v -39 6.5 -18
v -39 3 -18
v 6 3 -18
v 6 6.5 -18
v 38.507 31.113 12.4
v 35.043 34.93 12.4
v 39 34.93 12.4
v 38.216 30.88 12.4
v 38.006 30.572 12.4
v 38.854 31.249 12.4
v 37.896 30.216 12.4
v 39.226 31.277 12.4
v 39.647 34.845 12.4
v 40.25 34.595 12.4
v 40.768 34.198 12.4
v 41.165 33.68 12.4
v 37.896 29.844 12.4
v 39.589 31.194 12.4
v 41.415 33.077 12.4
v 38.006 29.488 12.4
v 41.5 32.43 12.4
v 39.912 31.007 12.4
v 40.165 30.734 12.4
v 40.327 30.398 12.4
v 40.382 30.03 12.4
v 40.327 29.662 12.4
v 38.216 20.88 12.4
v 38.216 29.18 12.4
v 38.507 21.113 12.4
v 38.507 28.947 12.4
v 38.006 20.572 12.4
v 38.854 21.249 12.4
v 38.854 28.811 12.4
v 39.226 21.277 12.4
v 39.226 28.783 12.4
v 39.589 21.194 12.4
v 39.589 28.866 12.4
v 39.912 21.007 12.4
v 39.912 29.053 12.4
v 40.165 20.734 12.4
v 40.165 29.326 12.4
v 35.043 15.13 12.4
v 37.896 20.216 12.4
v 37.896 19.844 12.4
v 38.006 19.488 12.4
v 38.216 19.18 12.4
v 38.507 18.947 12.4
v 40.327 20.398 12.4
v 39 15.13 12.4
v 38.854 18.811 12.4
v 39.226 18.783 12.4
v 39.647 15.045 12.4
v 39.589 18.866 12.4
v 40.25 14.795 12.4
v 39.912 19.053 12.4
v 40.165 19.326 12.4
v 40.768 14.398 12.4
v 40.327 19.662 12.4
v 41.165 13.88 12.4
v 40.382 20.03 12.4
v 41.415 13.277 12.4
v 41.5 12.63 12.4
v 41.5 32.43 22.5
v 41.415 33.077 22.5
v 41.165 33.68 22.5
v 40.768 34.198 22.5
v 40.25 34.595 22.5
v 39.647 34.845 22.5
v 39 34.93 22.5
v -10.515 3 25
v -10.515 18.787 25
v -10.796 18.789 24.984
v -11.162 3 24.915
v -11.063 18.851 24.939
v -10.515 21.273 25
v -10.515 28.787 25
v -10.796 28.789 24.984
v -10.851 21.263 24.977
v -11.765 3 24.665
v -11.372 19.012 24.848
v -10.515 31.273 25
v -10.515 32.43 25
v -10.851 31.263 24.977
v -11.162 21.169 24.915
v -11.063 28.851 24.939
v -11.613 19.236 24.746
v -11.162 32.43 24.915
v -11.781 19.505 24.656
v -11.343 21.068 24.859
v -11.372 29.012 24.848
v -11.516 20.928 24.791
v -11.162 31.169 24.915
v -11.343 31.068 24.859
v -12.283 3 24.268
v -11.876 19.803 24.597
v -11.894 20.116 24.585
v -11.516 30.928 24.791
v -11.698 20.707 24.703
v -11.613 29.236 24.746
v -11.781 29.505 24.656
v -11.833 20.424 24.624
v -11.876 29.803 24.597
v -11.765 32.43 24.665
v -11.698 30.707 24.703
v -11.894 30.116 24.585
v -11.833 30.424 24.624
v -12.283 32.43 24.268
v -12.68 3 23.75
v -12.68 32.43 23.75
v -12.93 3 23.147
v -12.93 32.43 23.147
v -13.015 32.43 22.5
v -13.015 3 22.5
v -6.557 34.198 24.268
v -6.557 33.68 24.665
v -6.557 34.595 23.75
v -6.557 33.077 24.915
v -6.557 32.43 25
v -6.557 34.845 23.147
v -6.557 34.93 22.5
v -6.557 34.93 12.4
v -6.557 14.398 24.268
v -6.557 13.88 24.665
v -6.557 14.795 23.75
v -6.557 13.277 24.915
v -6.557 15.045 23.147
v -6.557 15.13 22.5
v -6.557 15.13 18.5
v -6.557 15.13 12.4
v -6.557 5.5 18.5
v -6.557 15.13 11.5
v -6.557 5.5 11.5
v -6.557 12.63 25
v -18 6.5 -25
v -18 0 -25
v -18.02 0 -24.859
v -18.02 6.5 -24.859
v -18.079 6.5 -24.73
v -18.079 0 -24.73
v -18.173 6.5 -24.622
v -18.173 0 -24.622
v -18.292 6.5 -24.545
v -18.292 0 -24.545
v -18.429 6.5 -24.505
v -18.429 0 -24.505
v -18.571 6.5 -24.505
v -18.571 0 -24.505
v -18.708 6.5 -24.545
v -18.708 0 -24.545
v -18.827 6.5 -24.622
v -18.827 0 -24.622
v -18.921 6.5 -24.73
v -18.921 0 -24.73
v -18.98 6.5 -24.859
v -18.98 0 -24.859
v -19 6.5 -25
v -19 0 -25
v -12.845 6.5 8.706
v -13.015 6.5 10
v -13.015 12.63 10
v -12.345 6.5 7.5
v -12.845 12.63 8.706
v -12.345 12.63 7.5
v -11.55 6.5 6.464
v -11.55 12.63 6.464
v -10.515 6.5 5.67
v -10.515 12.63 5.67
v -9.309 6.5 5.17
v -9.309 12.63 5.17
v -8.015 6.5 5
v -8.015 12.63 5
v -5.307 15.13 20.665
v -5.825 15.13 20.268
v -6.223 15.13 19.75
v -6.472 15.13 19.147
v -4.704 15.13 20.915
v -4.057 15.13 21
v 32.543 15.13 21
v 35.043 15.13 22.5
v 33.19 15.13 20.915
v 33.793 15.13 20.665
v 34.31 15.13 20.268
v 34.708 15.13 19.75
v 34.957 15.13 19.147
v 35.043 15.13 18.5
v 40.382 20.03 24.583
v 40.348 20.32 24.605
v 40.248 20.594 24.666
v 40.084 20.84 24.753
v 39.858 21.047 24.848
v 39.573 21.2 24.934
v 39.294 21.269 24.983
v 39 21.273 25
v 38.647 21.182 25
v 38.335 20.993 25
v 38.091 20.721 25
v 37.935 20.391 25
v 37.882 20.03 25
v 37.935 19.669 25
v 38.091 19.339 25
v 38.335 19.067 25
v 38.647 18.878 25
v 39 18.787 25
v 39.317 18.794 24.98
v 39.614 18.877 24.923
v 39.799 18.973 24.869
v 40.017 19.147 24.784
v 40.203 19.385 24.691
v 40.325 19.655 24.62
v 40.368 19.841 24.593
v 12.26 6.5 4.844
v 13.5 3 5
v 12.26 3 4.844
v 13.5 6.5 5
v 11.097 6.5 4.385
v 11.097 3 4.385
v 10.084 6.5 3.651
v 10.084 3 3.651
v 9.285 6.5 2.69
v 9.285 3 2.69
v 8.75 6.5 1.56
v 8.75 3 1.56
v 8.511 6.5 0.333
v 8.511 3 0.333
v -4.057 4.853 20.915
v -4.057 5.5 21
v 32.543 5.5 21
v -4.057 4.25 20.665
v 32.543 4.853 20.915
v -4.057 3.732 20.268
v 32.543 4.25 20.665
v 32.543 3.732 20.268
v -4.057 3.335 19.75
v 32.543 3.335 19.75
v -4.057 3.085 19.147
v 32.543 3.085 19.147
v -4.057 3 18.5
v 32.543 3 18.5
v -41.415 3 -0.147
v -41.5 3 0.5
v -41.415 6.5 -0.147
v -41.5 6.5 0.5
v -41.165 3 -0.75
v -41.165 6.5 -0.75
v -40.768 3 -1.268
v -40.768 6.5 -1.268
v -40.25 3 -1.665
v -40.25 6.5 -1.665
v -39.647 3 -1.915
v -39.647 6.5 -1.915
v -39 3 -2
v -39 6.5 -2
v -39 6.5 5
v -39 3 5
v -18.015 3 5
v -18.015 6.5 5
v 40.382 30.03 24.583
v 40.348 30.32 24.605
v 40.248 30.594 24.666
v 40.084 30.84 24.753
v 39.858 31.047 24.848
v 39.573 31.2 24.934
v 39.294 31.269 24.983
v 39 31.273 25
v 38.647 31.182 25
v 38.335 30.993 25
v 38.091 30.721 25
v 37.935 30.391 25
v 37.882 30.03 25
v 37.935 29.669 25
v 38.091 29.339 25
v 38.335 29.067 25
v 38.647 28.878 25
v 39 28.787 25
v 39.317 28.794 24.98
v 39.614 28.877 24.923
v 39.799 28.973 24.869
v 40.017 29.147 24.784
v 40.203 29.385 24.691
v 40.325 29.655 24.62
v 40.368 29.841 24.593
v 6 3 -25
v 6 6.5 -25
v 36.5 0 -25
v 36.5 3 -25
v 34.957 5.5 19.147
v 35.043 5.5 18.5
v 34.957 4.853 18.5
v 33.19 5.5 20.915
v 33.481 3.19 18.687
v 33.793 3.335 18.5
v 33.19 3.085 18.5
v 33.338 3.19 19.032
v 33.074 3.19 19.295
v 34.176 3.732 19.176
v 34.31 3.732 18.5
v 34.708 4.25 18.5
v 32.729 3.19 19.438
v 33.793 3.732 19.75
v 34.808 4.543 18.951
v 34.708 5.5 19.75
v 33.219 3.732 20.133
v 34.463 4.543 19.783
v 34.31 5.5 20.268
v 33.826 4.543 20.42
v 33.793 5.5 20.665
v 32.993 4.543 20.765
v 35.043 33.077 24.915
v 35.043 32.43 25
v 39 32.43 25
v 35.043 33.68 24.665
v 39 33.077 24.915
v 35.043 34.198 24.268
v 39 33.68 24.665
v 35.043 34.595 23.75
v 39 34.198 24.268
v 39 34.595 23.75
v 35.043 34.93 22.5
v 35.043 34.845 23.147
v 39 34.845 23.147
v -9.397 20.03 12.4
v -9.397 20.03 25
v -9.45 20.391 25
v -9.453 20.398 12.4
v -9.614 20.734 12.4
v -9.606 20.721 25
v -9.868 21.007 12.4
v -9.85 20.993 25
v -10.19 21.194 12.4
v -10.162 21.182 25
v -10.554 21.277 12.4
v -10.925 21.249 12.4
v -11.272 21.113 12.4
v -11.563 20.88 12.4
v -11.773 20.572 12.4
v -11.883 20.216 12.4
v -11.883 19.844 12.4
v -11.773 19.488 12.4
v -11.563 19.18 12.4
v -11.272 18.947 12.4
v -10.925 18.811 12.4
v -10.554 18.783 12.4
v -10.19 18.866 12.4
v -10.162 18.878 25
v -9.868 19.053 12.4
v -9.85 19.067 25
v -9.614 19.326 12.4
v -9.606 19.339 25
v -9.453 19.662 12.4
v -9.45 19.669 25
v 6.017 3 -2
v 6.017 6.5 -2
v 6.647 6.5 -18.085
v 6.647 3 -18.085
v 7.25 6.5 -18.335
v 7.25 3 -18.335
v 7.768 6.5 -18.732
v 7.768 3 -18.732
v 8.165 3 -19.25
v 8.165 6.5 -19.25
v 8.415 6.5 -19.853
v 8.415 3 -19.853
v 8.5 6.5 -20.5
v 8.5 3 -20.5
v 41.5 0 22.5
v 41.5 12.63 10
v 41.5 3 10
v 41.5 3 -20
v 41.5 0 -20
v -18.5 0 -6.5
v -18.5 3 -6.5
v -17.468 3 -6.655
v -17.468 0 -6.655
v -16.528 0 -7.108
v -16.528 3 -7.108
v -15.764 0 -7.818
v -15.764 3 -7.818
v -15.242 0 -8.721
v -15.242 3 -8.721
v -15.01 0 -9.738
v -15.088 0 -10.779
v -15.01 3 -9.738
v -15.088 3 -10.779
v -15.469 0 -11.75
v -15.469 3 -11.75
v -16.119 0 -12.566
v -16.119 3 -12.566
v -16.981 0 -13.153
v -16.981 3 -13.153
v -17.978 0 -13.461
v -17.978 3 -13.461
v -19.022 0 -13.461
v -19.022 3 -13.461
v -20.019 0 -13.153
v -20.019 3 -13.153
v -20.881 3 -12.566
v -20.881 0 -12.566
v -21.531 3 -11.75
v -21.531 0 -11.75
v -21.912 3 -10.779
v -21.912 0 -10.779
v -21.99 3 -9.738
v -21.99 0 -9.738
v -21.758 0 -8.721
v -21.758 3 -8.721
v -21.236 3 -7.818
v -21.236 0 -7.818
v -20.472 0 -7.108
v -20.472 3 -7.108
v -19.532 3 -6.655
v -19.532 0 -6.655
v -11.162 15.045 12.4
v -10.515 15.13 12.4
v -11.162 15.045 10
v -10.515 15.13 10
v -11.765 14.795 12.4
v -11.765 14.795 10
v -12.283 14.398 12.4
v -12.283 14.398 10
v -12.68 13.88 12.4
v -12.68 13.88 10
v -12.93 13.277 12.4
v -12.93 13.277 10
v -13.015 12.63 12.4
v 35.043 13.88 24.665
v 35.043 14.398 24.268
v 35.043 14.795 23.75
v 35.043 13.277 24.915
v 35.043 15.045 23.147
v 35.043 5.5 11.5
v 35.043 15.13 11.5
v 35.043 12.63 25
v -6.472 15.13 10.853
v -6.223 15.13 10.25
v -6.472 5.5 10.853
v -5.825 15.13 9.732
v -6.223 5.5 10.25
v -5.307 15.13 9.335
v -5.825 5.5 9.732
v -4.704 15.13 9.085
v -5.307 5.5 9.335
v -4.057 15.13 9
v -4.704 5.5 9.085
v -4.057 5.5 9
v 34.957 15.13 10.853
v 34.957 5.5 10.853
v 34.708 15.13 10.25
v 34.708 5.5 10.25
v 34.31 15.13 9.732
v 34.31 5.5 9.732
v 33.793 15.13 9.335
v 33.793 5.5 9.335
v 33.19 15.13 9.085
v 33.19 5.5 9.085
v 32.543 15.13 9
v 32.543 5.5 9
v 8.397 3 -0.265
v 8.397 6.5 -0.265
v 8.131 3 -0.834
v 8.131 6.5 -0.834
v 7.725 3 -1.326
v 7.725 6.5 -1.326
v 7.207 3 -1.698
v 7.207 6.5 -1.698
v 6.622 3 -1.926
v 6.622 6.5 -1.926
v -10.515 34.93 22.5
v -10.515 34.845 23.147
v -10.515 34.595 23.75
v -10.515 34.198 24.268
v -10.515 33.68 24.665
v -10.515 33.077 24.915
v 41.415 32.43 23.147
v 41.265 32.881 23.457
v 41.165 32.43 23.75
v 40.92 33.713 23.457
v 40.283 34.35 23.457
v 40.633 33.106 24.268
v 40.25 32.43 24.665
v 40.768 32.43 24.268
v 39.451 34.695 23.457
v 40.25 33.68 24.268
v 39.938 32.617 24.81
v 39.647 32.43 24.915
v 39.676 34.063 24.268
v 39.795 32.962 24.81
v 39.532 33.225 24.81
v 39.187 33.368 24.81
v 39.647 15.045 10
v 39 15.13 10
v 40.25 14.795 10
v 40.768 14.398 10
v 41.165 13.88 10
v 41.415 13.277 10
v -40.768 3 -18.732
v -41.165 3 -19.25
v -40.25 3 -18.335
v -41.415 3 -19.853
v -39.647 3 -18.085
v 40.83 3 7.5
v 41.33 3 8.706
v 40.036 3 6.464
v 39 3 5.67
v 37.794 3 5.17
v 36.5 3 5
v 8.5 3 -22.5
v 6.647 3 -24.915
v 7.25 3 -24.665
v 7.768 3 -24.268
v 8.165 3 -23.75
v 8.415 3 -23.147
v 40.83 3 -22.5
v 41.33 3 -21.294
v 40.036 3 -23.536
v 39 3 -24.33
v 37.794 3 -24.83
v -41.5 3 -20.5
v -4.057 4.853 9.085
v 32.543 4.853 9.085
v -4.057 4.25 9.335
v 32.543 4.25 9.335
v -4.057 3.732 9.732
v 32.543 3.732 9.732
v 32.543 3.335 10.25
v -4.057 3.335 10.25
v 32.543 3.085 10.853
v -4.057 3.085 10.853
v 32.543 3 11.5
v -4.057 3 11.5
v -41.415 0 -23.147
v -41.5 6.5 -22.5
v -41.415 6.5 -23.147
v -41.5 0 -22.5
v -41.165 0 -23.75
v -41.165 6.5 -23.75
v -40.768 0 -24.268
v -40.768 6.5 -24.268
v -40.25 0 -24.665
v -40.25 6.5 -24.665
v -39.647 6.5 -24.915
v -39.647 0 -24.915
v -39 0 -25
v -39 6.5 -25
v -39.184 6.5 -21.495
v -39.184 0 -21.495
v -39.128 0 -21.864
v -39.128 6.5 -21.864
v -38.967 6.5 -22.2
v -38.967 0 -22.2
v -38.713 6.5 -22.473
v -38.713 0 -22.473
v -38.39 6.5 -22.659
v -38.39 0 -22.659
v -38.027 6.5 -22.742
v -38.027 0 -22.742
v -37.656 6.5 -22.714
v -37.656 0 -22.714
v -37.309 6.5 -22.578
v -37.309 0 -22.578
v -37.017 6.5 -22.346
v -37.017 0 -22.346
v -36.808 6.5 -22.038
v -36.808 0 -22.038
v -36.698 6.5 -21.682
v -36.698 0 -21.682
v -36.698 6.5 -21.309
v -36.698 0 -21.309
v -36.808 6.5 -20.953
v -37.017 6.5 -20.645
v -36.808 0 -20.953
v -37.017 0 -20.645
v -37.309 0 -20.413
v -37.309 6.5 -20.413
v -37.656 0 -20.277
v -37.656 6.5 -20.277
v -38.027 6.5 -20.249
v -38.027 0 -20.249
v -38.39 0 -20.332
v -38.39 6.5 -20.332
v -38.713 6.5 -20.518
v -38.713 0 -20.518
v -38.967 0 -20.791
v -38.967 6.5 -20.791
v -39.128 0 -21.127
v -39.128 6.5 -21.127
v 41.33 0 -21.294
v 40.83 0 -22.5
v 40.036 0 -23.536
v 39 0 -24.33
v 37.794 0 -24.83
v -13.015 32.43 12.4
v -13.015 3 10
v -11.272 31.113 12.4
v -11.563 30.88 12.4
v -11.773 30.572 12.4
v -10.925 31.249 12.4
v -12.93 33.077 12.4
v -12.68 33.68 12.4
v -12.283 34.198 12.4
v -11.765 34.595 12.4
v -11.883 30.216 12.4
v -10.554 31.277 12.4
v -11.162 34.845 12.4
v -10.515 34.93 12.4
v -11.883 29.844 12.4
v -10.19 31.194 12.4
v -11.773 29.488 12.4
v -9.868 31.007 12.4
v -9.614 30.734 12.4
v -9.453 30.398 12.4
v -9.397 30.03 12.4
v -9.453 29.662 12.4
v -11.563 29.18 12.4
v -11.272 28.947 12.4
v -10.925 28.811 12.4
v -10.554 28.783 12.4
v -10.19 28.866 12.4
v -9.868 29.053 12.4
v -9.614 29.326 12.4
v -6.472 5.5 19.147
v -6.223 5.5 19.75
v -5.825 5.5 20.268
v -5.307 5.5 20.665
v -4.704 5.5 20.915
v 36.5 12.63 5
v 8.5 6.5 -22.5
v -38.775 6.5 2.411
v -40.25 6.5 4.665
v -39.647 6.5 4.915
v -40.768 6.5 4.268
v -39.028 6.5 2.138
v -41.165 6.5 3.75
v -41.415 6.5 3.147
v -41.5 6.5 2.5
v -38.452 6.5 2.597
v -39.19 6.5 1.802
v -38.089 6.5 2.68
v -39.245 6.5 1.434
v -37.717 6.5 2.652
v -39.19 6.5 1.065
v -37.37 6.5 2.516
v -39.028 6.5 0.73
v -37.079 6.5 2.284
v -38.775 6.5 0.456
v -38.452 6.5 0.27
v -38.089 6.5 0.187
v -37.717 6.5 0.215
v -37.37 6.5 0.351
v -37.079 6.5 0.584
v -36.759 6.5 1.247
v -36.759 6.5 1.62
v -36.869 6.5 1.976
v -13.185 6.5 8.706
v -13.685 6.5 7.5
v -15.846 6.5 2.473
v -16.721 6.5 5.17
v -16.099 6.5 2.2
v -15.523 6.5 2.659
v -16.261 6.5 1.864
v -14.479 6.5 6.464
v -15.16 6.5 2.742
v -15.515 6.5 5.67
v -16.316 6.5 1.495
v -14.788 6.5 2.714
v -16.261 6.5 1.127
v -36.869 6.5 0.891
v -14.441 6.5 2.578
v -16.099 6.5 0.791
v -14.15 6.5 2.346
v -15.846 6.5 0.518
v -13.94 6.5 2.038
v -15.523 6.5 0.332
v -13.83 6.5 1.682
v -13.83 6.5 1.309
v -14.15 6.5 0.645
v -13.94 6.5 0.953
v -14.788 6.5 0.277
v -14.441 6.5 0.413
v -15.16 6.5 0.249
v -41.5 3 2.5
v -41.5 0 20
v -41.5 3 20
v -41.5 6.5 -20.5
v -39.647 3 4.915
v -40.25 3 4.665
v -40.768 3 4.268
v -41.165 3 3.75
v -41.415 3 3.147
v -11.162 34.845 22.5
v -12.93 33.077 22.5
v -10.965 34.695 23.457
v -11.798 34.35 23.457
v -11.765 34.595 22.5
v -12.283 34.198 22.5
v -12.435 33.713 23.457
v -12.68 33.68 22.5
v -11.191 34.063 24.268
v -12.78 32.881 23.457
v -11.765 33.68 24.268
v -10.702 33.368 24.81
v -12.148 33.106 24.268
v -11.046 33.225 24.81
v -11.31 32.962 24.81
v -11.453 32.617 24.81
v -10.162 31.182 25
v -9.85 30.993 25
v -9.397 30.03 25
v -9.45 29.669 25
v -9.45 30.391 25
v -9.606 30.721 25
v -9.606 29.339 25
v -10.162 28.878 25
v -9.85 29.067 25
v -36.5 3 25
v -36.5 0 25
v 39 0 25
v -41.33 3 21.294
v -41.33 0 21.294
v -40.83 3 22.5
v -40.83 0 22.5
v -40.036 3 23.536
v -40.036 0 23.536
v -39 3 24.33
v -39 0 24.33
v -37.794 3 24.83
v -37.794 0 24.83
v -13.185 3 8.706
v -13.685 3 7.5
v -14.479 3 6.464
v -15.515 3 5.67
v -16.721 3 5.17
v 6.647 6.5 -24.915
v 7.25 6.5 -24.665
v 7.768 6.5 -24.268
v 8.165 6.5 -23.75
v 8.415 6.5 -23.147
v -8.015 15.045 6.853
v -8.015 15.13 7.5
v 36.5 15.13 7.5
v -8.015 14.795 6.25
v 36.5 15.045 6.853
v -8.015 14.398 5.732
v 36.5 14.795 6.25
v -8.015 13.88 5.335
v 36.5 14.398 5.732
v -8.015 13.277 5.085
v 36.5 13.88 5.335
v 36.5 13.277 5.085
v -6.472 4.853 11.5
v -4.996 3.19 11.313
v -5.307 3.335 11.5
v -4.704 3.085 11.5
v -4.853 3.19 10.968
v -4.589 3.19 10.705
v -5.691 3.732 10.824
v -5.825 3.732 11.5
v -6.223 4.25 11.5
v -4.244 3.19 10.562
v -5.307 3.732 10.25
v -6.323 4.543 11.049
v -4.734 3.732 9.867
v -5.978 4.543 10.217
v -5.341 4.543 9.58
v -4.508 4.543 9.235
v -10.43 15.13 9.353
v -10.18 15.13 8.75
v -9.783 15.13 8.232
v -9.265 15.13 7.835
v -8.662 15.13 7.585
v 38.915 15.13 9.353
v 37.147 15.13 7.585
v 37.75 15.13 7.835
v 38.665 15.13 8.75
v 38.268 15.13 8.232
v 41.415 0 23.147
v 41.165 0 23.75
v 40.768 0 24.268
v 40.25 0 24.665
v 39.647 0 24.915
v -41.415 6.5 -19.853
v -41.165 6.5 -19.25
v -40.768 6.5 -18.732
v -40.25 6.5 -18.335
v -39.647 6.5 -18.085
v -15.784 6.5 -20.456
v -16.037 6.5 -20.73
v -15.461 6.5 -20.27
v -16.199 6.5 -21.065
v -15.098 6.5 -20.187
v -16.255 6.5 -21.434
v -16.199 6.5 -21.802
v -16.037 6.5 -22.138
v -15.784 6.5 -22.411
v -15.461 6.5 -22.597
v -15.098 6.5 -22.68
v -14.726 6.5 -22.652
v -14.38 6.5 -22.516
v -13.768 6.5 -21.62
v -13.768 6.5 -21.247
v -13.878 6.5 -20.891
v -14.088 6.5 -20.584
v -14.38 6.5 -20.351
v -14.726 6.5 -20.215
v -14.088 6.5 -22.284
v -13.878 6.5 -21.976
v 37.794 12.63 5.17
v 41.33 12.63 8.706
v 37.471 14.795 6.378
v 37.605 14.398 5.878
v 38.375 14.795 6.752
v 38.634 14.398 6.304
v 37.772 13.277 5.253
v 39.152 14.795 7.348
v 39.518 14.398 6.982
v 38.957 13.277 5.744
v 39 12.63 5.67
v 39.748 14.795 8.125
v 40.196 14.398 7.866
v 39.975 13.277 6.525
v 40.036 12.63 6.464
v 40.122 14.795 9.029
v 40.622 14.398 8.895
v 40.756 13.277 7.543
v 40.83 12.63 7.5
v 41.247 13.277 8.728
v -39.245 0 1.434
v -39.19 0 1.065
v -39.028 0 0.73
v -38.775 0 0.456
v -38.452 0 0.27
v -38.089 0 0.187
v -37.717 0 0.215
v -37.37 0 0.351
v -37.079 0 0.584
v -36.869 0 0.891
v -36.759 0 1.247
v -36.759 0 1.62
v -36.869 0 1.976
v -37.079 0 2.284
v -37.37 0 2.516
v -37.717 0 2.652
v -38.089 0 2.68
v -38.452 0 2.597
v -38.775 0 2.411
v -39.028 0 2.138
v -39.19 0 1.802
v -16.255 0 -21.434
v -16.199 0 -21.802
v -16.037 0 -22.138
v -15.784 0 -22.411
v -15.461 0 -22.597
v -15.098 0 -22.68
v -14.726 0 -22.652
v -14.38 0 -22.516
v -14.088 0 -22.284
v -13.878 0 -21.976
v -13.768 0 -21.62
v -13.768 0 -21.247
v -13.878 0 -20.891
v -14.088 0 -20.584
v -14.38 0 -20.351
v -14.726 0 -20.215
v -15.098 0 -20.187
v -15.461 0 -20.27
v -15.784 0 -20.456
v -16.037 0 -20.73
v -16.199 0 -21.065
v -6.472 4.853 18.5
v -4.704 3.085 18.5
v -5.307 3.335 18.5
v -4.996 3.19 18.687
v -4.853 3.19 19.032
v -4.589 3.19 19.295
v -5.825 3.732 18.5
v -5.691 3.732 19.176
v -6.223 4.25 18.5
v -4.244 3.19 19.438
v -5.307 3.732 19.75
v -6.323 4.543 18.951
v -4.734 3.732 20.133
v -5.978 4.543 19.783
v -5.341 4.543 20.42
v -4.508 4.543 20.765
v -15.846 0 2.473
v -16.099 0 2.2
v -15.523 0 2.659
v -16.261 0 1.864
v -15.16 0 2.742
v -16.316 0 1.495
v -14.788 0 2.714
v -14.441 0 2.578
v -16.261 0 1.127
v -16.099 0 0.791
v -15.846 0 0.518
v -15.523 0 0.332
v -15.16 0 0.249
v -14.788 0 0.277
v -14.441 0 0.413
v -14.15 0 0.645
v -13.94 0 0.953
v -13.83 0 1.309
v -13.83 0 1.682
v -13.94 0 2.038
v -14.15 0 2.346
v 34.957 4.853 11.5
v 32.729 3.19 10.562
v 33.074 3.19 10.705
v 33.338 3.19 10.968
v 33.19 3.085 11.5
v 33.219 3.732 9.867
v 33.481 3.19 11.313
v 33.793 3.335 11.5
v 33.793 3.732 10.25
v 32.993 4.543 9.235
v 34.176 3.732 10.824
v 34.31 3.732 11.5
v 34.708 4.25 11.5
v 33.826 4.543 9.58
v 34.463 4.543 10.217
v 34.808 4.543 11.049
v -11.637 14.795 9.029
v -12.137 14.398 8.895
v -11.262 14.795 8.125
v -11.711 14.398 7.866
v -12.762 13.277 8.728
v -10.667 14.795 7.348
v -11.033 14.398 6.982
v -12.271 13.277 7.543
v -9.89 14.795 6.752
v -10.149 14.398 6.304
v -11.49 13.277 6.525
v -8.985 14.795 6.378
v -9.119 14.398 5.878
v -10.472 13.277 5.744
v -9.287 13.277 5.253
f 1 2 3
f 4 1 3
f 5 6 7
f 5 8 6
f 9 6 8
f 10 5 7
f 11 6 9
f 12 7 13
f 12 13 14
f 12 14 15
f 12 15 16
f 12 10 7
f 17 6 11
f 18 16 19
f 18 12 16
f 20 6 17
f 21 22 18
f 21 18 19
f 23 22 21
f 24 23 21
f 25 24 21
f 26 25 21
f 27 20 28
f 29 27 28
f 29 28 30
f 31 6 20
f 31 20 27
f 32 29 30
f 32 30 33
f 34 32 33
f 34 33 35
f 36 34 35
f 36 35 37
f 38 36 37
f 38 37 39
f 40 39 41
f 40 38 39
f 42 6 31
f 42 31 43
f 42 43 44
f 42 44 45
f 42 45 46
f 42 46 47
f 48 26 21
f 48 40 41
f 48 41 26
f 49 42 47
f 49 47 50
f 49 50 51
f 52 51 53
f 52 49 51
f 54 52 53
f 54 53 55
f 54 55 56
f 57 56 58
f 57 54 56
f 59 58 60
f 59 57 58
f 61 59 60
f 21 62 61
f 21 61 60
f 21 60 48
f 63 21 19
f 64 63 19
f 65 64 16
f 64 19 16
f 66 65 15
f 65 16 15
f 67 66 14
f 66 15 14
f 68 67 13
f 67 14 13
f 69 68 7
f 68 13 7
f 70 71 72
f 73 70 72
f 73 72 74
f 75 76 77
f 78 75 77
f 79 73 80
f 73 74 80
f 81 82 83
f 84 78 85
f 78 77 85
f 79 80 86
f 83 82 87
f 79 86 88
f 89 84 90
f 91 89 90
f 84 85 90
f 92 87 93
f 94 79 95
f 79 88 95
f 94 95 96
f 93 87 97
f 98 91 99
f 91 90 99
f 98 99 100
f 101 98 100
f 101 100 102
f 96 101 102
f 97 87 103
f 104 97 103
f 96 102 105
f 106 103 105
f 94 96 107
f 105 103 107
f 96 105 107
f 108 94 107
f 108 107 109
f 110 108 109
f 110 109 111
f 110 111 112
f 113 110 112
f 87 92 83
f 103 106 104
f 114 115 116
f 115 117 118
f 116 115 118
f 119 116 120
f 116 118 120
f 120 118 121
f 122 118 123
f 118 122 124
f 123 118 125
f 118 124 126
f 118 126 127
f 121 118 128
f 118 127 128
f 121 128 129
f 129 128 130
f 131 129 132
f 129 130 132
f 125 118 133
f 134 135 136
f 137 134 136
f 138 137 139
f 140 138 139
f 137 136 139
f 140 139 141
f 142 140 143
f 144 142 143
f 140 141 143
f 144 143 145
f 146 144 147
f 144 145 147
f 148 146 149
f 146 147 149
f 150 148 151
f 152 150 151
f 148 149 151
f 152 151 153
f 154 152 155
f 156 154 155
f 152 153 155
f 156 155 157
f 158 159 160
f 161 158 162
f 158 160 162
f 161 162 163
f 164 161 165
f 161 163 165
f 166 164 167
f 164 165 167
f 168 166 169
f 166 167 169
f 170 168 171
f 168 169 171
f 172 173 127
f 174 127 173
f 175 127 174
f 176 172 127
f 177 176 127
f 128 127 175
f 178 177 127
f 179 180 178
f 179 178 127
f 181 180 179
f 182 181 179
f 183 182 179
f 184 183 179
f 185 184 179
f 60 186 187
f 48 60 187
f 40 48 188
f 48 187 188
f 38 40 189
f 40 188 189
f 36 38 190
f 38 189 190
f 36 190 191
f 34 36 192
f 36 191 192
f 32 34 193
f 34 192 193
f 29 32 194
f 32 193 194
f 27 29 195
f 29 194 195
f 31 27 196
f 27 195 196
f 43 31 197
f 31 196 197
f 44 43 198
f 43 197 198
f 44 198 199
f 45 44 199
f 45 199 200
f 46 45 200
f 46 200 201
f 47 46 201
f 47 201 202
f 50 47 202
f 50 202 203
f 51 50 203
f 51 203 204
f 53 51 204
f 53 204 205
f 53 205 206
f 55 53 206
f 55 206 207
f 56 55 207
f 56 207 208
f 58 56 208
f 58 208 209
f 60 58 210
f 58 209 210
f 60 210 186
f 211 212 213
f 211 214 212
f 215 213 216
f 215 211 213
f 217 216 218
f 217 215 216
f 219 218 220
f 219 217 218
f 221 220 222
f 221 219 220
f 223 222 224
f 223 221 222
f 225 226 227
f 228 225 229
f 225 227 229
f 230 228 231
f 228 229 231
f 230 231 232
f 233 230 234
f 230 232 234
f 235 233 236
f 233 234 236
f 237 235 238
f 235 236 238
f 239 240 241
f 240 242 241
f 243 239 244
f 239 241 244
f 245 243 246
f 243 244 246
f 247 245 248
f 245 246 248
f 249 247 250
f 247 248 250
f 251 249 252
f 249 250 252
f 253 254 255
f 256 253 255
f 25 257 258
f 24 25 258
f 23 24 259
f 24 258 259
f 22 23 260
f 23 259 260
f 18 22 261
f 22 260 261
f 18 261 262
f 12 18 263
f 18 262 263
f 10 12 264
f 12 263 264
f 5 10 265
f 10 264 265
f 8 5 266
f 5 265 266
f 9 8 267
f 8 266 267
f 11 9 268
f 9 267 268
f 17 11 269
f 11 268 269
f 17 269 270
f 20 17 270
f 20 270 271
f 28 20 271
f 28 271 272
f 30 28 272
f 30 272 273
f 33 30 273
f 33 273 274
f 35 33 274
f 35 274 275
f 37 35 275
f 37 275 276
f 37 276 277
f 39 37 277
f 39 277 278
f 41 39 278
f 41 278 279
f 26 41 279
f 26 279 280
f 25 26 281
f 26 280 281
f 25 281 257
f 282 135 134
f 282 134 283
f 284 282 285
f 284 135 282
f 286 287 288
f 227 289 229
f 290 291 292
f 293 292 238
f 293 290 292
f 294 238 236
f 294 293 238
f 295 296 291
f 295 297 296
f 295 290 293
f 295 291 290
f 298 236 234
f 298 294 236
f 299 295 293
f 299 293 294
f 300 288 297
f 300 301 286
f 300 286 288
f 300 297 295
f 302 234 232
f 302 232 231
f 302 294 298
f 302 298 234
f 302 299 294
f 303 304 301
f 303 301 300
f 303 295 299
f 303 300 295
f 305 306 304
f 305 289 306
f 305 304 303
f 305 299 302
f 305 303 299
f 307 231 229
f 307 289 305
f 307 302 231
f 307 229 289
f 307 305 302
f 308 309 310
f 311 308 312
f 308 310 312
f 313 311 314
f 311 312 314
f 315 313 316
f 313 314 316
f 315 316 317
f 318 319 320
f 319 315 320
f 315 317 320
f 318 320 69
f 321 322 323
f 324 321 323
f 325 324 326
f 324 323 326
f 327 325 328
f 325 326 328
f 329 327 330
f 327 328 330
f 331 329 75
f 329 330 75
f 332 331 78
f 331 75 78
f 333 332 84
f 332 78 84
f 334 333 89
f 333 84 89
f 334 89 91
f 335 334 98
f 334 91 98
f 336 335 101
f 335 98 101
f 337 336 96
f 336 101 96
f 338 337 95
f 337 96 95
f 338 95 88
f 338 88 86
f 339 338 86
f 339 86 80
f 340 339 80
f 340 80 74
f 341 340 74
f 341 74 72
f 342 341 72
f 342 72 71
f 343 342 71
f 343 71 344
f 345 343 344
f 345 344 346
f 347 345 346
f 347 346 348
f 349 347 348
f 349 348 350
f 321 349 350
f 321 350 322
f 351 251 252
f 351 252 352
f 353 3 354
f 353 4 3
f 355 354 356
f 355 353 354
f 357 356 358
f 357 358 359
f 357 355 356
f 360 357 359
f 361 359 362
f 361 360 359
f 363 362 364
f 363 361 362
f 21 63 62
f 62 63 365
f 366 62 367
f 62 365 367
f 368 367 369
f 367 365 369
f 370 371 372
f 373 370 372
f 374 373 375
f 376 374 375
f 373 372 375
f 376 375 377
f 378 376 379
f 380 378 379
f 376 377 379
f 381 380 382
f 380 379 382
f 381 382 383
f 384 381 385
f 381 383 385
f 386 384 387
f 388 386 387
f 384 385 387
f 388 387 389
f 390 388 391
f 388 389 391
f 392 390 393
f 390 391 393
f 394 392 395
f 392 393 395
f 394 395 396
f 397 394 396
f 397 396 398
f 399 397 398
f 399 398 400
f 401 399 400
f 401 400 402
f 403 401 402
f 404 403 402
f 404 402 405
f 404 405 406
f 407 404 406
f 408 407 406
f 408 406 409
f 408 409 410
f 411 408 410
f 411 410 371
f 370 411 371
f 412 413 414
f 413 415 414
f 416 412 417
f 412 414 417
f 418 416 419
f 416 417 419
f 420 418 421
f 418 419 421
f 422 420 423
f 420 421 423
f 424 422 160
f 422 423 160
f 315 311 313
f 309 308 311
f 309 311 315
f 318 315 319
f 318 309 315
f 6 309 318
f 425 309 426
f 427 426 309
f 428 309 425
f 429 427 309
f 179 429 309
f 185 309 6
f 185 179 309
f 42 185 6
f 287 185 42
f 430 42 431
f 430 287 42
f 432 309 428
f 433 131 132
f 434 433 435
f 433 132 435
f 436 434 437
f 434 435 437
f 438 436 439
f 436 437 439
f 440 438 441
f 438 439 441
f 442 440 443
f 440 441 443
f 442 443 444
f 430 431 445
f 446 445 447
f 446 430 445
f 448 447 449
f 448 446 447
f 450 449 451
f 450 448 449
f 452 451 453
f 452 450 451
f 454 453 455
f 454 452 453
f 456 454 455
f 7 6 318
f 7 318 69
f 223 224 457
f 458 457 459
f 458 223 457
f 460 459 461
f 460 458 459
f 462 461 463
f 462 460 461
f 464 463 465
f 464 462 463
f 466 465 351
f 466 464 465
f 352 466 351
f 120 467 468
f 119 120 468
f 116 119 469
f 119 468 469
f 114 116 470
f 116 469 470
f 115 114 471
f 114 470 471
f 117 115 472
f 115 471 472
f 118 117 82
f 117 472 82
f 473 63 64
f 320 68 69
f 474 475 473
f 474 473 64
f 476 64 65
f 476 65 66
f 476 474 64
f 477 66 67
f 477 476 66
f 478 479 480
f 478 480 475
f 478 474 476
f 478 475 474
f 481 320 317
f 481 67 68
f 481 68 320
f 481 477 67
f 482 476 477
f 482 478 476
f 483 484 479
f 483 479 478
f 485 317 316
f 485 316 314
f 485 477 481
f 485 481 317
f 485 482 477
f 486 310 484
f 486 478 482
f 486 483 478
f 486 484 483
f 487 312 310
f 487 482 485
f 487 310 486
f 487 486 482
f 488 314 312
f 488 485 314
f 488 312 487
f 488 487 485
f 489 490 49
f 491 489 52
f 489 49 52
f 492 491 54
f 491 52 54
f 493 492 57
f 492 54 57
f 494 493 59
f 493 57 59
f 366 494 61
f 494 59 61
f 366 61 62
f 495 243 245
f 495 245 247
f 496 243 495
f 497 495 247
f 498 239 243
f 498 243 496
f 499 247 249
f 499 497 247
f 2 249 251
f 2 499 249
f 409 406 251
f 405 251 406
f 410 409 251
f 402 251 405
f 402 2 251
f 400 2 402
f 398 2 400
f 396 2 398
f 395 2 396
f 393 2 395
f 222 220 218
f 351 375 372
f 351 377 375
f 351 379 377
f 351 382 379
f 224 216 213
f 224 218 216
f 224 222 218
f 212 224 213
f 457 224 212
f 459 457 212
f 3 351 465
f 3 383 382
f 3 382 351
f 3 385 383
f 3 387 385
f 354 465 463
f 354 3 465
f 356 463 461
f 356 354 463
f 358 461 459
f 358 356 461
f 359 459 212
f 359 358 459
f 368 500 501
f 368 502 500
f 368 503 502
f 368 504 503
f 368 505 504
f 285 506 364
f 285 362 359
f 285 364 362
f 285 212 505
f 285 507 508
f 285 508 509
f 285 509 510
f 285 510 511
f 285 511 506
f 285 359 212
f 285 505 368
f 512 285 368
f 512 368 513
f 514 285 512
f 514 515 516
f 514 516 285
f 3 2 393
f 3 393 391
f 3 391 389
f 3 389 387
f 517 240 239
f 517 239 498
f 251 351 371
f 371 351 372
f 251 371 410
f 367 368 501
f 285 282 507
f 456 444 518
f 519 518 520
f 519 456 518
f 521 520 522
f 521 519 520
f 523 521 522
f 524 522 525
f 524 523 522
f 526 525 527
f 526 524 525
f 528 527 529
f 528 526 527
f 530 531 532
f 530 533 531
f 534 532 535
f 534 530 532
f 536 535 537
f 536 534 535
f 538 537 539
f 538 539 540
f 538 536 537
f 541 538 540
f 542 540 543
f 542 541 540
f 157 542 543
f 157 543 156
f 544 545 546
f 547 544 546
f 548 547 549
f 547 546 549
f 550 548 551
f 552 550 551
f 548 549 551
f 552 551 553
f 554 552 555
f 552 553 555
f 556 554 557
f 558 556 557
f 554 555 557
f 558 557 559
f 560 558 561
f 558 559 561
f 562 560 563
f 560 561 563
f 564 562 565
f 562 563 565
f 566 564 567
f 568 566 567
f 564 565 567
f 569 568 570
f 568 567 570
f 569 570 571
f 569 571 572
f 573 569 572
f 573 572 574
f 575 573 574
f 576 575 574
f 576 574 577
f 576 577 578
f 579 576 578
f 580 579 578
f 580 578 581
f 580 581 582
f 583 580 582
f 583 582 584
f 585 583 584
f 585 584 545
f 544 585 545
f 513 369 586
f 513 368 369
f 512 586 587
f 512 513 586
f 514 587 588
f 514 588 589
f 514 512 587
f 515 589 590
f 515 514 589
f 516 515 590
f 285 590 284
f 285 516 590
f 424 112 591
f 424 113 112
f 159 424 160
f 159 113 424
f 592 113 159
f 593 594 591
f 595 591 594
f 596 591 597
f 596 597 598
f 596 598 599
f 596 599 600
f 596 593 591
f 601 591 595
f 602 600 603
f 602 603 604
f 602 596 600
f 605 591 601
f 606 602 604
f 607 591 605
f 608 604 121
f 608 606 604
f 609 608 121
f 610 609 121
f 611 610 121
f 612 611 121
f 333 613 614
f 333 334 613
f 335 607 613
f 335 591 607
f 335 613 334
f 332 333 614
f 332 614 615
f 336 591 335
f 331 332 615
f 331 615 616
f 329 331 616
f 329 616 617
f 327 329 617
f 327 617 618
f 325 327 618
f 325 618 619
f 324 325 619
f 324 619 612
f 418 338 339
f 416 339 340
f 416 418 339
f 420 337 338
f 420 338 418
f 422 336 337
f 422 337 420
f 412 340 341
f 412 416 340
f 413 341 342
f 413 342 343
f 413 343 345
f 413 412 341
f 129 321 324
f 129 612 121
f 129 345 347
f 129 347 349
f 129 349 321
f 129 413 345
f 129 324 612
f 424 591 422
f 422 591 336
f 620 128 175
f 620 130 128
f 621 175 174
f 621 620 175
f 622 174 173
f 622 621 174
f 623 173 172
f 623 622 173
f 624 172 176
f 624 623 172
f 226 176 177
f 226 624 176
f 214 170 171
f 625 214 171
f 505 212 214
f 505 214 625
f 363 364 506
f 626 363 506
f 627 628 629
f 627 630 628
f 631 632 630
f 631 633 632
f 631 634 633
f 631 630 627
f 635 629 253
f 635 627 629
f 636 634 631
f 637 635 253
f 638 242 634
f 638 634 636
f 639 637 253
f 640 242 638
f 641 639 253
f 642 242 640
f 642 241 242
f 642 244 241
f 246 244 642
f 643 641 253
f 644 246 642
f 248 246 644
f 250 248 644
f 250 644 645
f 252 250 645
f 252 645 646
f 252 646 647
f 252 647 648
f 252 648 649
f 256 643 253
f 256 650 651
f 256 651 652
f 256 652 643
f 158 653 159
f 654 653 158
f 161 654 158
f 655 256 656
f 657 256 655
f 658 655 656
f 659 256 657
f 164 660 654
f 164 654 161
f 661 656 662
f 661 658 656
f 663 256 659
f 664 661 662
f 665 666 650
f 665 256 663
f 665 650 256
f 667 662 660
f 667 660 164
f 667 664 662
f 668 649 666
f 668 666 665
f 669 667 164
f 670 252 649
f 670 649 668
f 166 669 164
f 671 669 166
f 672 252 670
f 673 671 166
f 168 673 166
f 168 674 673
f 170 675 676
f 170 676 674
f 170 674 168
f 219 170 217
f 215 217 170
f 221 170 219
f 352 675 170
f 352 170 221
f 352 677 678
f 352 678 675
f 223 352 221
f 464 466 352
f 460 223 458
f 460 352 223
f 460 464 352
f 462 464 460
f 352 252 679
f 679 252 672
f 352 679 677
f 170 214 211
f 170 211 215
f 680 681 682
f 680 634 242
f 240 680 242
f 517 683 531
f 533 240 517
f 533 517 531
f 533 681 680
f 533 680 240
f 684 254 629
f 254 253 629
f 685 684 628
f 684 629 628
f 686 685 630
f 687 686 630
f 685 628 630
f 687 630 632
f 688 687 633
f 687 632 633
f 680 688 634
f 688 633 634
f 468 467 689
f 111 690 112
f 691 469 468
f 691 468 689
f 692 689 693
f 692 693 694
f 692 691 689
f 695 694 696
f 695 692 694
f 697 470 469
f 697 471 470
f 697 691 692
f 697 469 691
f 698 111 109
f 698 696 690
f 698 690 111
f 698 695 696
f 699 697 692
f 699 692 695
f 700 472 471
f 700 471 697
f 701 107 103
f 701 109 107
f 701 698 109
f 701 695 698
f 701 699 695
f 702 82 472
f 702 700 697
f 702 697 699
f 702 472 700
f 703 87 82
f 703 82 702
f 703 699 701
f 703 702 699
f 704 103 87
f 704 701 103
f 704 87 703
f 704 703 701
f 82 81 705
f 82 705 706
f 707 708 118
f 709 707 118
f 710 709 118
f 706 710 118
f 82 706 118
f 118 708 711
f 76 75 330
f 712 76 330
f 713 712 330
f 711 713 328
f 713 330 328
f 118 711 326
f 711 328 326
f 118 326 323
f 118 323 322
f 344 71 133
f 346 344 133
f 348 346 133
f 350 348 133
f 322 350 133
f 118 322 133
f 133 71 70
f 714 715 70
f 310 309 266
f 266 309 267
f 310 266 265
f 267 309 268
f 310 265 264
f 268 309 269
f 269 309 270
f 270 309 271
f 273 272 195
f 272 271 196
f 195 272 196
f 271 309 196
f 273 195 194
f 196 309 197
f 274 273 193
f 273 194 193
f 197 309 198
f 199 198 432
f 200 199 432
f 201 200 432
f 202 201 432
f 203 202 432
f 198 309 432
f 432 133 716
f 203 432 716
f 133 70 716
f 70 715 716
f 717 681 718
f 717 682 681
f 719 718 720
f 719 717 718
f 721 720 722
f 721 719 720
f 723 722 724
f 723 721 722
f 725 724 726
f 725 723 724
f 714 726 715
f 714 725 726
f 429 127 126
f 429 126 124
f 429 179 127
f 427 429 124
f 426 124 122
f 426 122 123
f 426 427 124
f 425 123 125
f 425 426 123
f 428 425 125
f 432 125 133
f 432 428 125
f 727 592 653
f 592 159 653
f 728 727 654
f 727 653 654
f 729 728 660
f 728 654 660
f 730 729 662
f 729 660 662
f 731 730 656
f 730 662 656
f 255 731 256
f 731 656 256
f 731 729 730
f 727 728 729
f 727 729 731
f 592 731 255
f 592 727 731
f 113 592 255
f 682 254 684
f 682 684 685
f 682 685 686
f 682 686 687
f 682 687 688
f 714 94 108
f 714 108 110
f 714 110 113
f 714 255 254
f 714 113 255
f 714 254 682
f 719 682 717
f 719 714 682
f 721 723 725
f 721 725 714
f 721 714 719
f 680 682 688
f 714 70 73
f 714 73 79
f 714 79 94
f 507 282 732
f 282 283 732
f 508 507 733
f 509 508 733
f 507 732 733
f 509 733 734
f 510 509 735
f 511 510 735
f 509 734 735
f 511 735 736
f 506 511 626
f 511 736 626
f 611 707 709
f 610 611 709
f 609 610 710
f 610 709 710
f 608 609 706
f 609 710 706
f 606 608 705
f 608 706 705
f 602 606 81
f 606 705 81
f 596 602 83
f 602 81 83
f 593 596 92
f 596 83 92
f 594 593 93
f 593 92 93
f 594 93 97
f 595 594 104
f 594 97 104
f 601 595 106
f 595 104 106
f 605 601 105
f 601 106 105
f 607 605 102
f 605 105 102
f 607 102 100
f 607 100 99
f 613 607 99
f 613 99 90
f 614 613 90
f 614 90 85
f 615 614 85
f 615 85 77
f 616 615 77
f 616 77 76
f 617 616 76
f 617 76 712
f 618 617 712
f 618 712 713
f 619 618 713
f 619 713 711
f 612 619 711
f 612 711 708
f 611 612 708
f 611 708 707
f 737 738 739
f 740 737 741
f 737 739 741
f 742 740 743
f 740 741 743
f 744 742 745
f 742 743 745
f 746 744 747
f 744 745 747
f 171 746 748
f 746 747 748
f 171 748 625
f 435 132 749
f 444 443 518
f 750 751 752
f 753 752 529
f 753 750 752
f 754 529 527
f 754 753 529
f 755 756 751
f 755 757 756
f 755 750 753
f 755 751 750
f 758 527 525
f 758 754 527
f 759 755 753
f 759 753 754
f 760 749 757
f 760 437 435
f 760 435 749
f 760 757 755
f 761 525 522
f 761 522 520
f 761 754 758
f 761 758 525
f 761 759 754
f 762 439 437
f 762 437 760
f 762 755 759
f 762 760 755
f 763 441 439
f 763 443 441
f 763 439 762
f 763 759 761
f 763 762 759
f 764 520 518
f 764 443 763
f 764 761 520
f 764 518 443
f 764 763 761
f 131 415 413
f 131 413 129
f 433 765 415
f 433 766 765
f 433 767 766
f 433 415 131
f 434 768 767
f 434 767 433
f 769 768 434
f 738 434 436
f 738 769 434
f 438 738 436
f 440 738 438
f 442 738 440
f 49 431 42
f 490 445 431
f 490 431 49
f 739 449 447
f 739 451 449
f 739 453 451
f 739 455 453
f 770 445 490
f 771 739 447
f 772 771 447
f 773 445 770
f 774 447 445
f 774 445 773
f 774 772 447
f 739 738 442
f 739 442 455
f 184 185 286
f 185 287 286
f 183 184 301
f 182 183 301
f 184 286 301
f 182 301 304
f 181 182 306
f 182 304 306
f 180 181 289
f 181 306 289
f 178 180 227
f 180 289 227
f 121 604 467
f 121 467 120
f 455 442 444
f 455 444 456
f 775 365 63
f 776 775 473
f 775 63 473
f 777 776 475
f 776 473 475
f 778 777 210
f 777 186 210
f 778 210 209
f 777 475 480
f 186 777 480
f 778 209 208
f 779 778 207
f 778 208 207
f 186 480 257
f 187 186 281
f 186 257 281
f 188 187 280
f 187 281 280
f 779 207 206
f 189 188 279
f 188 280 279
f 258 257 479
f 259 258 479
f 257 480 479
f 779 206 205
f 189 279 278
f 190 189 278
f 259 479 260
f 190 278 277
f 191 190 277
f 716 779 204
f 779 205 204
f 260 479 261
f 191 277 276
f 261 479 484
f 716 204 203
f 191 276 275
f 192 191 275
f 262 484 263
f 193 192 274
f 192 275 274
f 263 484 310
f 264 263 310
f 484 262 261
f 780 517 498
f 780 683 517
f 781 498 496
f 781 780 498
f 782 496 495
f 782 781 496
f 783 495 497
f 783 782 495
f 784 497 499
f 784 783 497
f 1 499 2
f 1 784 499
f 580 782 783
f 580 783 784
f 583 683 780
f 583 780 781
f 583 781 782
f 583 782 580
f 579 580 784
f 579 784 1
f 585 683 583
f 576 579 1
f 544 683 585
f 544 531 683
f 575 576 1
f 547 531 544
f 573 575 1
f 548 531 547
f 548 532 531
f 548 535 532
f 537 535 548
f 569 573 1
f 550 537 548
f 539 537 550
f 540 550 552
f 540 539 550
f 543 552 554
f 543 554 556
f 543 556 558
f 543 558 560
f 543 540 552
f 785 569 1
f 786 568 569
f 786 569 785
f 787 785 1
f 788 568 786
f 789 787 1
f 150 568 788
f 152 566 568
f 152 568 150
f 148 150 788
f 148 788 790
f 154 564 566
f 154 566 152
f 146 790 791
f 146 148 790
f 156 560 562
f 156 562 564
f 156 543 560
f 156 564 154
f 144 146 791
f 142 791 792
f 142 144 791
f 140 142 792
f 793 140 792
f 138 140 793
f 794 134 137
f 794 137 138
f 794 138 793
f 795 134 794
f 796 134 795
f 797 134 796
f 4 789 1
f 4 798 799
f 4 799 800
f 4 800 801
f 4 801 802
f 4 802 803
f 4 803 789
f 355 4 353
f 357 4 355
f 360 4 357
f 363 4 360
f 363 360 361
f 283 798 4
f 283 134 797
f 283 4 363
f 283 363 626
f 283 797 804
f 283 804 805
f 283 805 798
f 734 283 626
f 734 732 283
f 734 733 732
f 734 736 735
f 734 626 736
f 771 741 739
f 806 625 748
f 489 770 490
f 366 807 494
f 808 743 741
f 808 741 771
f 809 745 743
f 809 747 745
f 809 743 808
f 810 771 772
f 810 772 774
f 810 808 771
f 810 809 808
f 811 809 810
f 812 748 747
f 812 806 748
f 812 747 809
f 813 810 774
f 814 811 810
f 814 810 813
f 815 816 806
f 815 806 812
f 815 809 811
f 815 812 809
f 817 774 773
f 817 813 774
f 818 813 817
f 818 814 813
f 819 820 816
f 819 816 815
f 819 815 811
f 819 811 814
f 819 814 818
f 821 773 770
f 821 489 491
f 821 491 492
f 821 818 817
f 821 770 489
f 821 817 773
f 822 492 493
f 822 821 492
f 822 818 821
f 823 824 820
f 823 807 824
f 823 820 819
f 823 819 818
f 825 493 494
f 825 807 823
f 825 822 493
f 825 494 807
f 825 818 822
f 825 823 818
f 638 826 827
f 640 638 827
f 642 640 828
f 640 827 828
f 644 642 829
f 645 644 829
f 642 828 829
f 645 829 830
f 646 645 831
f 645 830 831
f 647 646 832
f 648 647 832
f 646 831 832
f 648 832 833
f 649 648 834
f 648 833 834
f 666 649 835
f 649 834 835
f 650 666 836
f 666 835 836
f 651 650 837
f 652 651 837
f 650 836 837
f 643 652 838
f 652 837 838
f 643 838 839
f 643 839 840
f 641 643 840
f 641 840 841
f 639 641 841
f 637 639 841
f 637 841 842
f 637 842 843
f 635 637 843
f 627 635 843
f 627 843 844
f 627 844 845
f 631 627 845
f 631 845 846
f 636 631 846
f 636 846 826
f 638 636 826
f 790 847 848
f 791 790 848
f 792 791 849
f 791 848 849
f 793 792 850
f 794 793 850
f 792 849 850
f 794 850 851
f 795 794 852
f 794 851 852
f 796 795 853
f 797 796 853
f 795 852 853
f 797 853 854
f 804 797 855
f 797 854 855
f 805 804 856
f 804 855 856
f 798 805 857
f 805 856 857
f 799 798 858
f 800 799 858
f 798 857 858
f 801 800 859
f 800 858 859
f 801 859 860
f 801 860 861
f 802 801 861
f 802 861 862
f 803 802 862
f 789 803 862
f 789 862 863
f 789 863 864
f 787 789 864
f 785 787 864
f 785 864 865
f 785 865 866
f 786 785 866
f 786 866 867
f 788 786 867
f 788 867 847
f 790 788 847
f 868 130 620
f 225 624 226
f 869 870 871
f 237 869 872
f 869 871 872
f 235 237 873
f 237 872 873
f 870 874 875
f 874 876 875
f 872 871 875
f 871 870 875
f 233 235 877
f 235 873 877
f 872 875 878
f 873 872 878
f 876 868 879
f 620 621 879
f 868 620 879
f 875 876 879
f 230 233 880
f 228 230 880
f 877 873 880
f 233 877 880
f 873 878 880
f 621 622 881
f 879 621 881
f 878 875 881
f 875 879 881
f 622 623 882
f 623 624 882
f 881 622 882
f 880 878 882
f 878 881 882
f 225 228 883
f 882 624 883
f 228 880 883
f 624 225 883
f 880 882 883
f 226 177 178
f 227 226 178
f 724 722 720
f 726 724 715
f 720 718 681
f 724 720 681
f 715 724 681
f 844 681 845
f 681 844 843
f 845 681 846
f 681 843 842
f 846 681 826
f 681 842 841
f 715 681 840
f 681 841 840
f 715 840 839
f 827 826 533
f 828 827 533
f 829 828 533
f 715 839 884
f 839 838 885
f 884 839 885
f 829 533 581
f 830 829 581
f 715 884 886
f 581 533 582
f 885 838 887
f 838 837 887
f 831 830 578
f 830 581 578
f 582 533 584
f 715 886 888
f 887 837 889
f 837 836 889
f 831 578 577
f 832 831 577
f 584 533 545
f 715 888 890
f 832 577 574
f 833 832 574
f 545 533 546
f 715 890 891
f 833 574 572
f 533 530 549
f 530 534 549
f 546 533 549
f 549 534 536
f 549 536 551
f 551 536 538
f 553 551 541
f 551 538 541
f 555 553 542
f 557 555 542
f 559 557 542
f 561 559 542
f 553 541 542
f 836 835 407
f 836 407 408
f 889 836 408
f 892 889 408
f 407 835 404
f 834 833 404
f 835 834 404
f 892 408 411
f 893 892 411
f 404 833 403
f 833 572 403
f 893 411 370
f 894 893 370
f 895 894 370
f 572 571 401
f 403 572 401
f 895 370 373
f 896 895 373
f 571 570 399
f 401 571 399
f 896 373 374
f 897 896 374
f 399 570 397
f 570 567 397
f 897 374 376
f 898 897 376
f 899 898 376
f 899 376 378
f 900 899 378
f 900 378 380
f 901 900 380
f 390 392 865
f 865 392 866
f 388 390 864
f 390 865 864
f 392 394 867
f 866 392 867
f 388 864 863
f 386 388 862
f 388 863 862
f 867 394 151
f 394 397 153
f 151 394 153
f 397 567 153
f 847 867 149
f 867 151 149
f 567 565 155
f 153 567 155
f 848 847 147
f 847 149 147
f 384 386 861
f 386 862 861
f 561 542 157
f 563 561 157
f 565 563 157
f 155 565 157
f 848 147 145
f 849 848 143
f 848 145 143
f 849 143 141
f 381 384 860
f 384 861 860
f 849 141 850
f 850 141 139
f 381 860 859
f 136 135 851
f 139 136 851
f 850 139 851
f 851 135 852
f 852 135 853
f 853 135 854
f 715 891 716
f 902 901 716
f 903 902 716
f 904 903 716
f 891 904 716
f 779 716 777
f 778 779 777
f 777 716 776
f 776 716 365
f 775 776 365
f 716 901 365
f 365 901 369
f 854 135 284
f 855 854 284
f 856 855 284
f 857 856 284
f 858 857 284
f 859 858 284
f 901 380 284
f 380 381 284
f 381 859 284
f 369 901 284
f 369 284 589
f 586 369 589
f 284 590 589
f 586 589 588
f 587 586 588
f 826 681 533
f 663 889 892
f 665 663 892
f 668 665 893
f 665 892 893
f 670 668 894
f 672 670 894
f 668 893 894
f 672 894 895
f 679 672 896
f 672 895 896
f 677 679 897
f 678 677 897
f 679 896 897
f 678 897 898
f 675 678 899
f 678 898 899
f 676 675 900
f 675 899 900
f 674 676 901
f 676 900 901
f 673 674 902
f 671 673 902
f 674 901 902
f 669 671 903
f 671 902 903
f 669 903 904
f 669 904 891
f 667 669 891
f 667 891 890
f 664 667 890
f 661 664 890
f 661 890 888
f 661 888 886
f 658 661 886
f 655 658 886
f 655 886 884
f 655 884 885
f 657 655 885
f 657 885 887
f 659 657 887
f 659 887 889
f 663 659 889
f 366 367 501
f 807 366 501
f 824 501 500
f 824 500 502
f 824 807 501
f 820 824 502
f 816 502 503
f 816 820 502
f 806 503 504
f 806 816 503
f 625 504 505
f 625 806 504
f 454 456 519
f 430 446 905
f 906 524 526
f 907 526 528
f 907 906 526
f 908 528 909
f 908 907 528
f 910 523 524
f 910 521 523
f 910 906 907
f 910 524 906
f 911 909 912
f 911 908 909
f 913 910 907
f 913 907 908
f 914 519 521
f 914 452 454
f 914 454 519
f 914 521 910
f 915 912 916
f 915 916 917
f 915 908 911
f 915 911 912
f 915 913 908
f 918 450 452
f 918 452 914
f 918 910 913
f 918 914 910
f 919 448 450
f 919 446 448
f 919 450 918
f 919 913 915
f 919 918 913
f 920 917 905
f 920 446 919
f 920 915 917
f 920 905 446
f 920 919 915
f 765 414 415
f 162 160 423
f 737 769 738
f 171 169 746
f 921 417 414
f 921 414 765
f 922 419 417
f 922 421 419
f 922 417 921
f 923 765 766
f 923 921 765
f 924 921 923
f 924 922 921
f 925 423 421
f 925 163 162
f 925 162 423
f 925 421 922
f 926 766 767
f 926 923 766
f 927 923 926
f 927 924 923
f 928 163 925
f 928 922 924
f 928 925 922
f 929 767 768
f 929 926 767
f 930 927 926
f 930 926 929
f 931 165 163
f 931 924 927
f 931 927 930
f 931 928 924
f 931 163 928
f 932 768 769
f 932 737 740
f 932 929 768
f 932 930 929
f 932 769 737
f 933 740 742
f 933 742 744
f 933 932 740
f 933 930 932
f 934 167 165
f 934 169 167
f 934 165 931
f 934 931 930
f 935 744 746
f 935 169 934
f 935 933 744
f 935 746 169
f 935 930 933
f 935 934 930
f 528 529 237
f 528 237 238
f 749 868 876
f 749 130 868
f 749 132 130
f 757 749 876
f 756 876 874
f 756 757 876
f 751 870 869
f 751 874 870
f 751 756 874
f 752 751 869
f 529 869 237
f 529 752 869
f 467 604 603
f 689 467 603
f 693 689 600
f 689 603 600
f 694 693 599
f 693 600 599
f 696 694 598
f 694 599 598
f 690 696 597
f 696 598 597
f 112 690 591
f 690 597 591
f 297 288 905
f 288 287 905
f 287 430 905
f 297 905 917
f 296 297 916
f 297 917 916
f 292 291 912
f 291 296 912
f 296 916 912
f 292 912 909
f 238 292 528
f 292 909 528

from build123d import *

# Parameters (mm, degrees)
SKETCH1_W             = 83
SKETCH1_H             = 50
BOSS_EXTRUDE1_DEPTH   = 3
SKETCH2_W             = 50
SKETCH2_H             = 7
BOSS_EXTRUDE2_DEPTH   = 3.5
SKETCH3_W             = 6.457447236
SKETCH3_H             = 12.6
BOSS_EXTRUDE3_DEPTH   = 31.93
M3X0_5_TAPPED_HOLE1_D = 2.5
SKETCH6_W             = 54.514894472
SKETCH6_H             = 20
BOSS_EXTRUDE4_DEPTH   = 12.13
SKETCH10_W            = 41.6
SKETCH10_H            = 12
CUT_EXTRUDE2_DEPTH    = 12.13
FILLET1_R             = 5
FILLET2_R             = 5
FILLET3_R             = 2.5
FILLET4_R             = 2.5
FILLET5_R             = 2.5
M3X0_5_TAPPED_HOLE2_D = 2.5
SKETCH9_R             = 3.5
CUT_EXTRUDE1_DEPTH    = 59.023916735
FILLET6_R             = 2.5
CUT_EXTRUDE3_DEPTH    = 60.727338073


with BuildPart() as part:
    # Sketch1 → Boss-Extrude1 (new body)
    with BuildSketch(Plane(origin=(0, 0, 0), x_dir=(1, 0, 0), z_dir=(0, 1, 0))):
        Rectangle(SKETCH1_W, SKETCH1_H)
    extrude(amount=BOSS_EXTRUDE1_DEPTH)

    # Sketch2 → Boss-Extrude2 (add)
    with BuildSketch(Plane(origin=(0, 3, 0), x_dir=(1, 0, 0), z_dir=(0, 1, 0))):
        with Locations((-16.5, 21.5)):
            Rectangle(SKETCH2_W, SKETCH2_H)
        with Locations((-16.5, -1.5)):
            Rectangle(SKETCH2_W, SKETCH2_H)
    extrude(amount=BOSS_EXTRUDE2_DEPTH)

    # Sketch3 → Boss-Extrude3 (add)
    with BuildSketch(Plane(origin=(0, 3, 0), x_dir=(1, 0, 0), z_dir=(0, 1, 0))):
        with Locations((38.271276382, -18.7)):
            Rectangle(SKETCH3_W, SKETCH3_H)
        with Locations((-9.786170854, -18.7)):
            Rectangle(SKETCH3_W, SKETCH3_H)
    extrude(amount=BOSS_EXTRUDE3_DEPTH)

    # M3x0.5 Tapped Hole1 (through all)
    with Locations(Plane(origin=(0, 0, 12.4), x_dir=(-1, 0, 0), z_dir=(0, 0, -1))):
        with Locations((-39.132166065, 30.03), (-39.132166065, 20.03), (10.647060537, 20.03), (10.647060537, 30.03)):
            Hole(M3X0_5_TAPPED_HOLE1_D / 2)

    # Sketch6 → Boss-Extrude4 (add)
    with BuildSketch(Plane(origin=(0, 3, 0), x_dir=(1, 0, 0), z_dir=(0, 1, 0))):
        with Locations((14.242552764, -15)):
            Rectangle(SKETCH6_W, SKETCH6_H)
    extrude(amount=BOSS_EXTRUDE4_DEPTH)

    # Sketch10 → Cut-Extrude2 (cut)
    with BuildSketch(Plane(origin=(0, 15.13, 0), x_dir=(1, 0, 0), z_dir=(0, 1, 0))):
        with Locations((14.242552764, -15)):
            Rectangle(SKETCH10_W, SKETCH10_H)
    extrude(amount=-CUT_EXTRUDE2_DEPTH, mode=Mode.SUBTRACT)

    # Fillet1
    fillet1_edges = [part.edges().sort_by_distance(p)[0] for p in [
        (8.5, 4.75, 5),
        (41.5, 9.065, 5),
        (-13.014894472, 4.75, 5),
    ]]
    fillet(fillet1_edges, radius=FILLET1_R)

    # Fillet2
    fillet2_edges = [part.edges().sort_by_distance(p)[0] for p in [
        (-13.014894472, 10.815, 5),
        (-41.5, 1.5, 25),
        (41.5, 1.5, -25),
    ]]
    fillet(fillet2_edges, radius=FILLET2_R)

    # Fillet3
    fillet3_edges = [part.edges().sort_by_distance(p)[0] for p in [
        (8.5, 4.75, -18),
        (-41.5, 4.75, -18),
        (-41.5, 4.75, -2),
        (8.5, 4.75, -2),
        (8.5, 4.75, -25),
        (-41.5, 4.75, 5),
        (-41.5, 3.25, -25),
    ]]
    fillet(fillet3_edges, radius=FILLET3_R)

    # Fillet4
    fillet4_edges = [part.edges().sort_by_distance(p)[0] for p in [
        (14.242552764, 15.13, 5),
        (40.035533906, 15.13, 6.464466094),
        (-13.014894472, 15.13, 11.2),
        (-11.550428378, 15.13, 6.464466094),
        (41.5, 15.13, 11.2),
        (14.242552764, 15.13, 25),
    ]]
    fillet(fillet4_edges, radius=FILLET4_R)

    # Fillet5
    # the kernel refuses this fillet: 2.5 mm, written as the material it takes off along each edge
    with BuildSketch(Plane(origin=(39, 32.43, 22.5), x_dir=(1, 0, 0), z_dir=(0, 0, 1))) as fillet5_piece_1_section:
        Polygon((0, 0), (FILLET5_R * 1.02, 0), (FILLET5_R * 1.02, FILLET5_R * 1.02), (0, FILLET5_R * 1.02), align=None)
    fillet5_piece_1 = extrude(amount=FILLET5_R * 1.02, mode=Mode.PRIVATE)
    fillet5_piece_1 = fillet5_piece_1 - Plane(origin=(39, 32.43, 22.5), x_dir=(-0.7071067811865475, -0.7071067811865475, 0), z_dir=(0, 0, 1)) * Sphere(FILLET5_R, mode=Mode.PRIVATE)
    add(fillet5_piece_1, mode=Mode.SUBTRACT)
    with BuildSketch(Plane(origin=(-10.514894472, 32.43, 22.5), x_dir=(-1, 0, 0), z_dir=(0, 0, 1))) as fillet5_piece_2_section:
        Polygon((0, 0), (FILLET5_R * 1.02, 0), (FILLET5_R * 1.02, -FILLET5_R * 1.02), (0, -FILLET5_R * 1.02), align=None)
    fillet5_piece_2 = extrude(amount=FILLET5_R * 1.02, mode=Mode.PRIVATE)
    fillet5_piece_2 = fillet5_piece_2 - Plane(origin=(-10.514894472, 32.43, 22.5), x_dir=(0.7071067811865475, -0.7071067811865475, 0), z_dir=(0, 0, 1)) * Sphere(FILLET5_R, mode=Mode.PRIVATE)
    add(fillet5_piece_2, mode=Mode.SUBTRACT)
    with BuildSketch(Plane(origin=(39, 34.93, 25), x_dir=(0, -1, 0), z_dir=(-1, 0, 0))) as fillet5_piece_3:
        with BuildLine():
            CenterArc((FILLET5_R, -FILLET5_R), FILLET5_R, 90, 90)
            Line((0, -FILLET5_R), (0, 0))
            Line((0, 0), (FILLET5_R, 0))
        make_face()
    extrude(amount=10.207447236, mode=Mode.SUBTRACT)
    with BuildSketch(Plane(origin=(41.5, 34.93, 6.15), x_dir=(-1, 0, 0), z_dir=(0, 0, 1)), Plane(origin=(-13.014894472, 34.93, 6.15), x_dir=(0, -1, 0), z_dir=(0, 0, 1))) as fillet5_piece_4:
        with BuildLine():
            CenterArc((FILLET5_R, FILLET5_R), FILLET5_R, 180, 90)
            Line((0, FILLET5_R), (0, 0))
            Line((0, 0), (FILLET5_R, 0))
        make_face()
    extrude(amount=16.35, mode=Mode.SUBTRACT)
    with BuildSketch(Plane(origin=(-10.514894472, 34.93, 25), x_dir=(0, -1, 0), z_dir=(1, 0, 0))) as fillet5_piece_5:
        with BuildLine():
            CenterArc((FILLET5_R, FILLET5_R), FILLET5_R, 180, 90)
            Line((0, FILLET5_R), (0, 0))
            Line((0, 0), (FILLET5_R, 0))
        make_face()
    extrude(amount=10.207447236, mode=Mode.SUBTRACT)
    with BuildSketch(Plane(origin=(-13.014894472, 32.43, 25), x_dir=(1, 0, 0), z_dir=(0, -1, 0))) as fillet5_piece_6:
        with BuildLine():
            CenterArc((FILLET5_R, -FILLET5_R), FILLET5_R, 90, 90)
            Line((0, -FILLET5_R), (0, 0))
            Line((0, 0), (FILLET5_R, 0))
        make_face()
    extrude(amount=29.43, mode=Mode.SUBTRACT)
    with BuildSketch(Plane(origin=(41.5, 32.43, 25), x_dir=(-1, 0, 0), z_dir=(0, -1, 0))) as fillet5_piece_7:
        with BuildLine():
            CenterArc((FILLET5_R, FILLET5_R), FILLET5_R, 180, 90)
            Line((0, FILLET5_R), (0, 0))
            Line((0, 0), (FILLET5_R, 0))
        make_face()
    extrude(amount=38.68, mode=Mode.SUBTRACT)

    # M3x0.5 Tapped Hole2 (through all)
    with Locations(Plane(origin=(0, 6.5, 0), x_dir=(1, 0, 0), z_dir=(0, 1, 0))):
        with Locations((-37.99546971, -1.433732), (-15.066268, -1.49546971), (-15.00453029, 21.433732), (-37.933732, 21.49546971)):
            Hole(M3X0_5_TAPPED_HOLE2_D / 2)

    # Sketch9 → Cut-Extrude1 (cut, through all)
    with BuildSketch(Plane(origin=(0, 3, 0), x_dir=(1, 0, 0), z_dir=(0, 1, 0))):
        with Locations(Location((-18.5, 10, 0), (0, 0, 270))):
            Circle(SKETCH9_R)
    extrude(amount=-CUT_EXTRUDE1_DEPTH, mode=Mode.SUBTRACT)

    # Fillet6
    fillet6_edges = [part.edges().sort_by_distance(p)[0] for p in [
        (-6.557447236, 9.065, 21),
        (-6.557447236, 9.065, 9),
        (35.042552764, 9.065, 9),
        (35.042552764, 9.065, 21),
        (-6.557447236, 3, 15),
        (14.242552764, 3, 9),
        (35.042552764, 3, 15),
        (14.242552764, 3, 21),
    ]]
    fillet(fillet6_edges, radius=FILLET6_R)

    # Sketch11 → Cut-Extrude3 (cut, through all)
    with BuildSketch(Plane.XZ):
        with BuildLine():
            Line((-19, -25), (-18, -25))
            ThreePointArc((-18, -25), (-18.5, -24.5), (-19, -25))
        make_face()
    extrude(amount=-CUT_EXTRUDE3_DEPTH, mode=Mode.SUBTRACT)


solid = part.part
